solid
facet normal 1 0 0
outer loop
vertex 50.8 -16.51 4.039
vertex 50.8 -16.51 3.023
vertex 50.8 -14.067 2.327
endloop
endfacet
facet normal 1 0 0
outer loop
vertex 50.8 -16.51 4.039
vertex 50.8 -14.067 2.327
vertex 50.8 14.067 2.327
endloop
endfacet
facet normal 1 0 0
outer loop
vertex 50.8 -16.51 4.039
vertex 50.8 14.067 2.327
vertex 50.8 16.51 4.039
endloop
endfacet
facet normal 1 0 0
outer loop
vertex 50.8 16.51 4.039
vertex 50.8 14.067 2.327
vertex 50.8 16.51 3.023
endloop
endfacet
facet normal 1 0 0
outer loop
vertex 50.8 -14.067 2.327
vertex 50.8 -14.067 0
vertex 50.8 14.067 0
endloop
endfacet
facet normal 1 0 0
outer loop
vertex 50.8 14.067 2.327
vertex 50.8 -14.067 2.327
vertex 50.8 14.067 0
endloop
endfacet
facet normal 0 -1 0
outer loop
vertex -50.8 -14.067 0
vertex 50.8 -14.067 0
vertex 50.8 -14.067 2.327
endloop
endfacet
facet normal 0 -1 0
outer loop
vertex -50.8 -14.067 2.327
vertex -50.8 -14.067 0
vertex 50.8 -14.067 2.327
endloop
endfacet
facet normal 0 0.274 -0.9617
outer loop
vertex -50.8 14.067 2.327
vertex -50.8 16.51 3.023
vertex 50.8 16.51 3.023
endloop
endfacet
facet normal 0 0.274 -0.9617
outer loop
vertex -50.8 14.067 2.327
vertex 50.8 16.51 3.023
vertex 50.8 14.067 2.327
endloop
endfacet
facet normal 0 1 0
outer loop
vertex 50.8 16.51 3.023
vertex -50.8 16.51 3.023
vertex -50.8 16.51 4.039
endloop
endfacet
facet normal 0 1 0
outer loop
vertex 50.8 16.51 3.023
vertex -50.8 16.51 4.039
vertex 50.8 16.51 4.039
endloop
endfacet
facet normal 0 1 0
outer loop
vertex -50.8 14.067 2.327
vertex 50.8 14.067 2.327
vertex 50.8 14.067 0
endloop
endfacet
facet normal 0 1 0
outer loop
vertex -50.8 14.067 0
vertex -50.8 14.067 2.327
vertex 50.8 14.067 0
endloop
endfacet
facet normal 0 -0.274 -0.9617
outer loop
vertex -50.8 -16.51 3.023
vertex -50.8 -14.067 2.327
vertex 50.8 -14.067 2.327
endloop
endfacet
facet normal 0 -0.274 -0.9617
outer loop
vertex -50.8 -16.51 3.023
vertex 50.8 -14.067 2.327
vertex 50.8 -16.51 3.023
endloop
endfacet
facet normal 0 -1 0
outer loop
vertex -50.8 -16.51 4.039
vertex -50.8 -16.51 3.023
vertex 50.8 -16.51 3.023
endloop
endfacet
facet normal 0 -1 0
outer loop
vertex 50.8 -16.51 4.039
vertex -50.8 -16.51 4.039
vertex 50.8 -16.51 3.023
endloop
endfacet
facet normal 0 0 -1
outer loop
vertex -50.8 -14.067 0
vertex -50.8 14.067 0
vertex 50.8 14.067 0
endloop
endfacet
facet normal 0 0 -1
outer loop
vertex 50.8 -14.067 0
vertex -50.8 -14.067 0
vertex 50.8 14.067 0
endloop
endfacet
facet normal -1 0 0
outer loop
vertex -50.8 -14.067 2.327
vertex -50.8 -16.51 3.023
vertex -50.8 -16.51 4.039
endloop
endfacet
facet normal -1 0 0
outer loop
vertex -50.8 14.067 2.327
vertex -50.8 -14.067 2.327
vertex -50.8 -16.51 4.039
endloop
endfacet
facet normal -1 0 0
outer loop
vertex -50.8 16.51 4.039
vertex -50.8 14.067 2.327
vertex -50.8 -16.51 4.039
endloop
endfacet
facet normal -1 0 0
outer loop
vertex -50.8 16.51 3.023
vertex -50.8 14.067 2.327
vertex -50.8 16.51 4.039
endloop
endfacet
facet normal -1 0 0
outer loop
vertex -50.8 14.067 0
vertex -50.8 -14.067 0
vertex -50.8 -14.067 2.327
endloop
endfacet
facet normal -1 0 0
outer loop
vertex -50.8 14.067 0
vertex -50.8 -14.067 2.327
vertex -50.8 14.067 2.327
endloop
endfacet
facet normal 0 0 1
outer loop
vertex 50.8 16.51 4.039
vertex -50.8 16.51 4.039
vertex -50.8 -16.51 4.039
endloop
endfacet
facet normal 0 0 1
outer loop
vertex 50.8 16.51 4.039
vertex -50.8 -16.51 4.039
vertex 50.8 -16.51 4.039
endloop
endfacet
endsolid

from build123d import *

# Parameters (mm, degrees)
F0_W     = 101.6
F0_H     = 33.02
F1_DEPTH = 4.0386
F3_DEPTH = 76.2
F4_DEPTH = 38.1
F5_DEPTH = 38.1


with BuildPart() as f1:
    # F0 (on Top) → F1 (new body)
    with BuildSketch(Plane.XY):
        Rectangle(F0_W, F0_H)
    extrude(amount=F1_DEPTH)

    # F2 (on face) → F3 (cut)
    with BuildSketch(Plane.YZ.offset(50.8)):
        Polygon((-16.51, 0), (-14.06698055, 0), (-14.06698055, 2.3274338565), (-16.51, 3.0226), align=None)
        Polygon((16.51, 0), (16.51, 3.0226), (14.06698055, 2.3274338565), (14.06698055, 0), align=None)
    extrude(amount=-F3_DEPTH, mode=Mode.SUBTRACT)

    # F4 (cut): a face of the model
    f4_faces = [f1.faces().sort_by_distance(p)[0] for p in [
        (-25.4, -15.3413966196, 1.345035768),
    ]]
    extrude(f4_faces, amount=-F4_DEPTH, mode=Mode.SUBTRACT)

    # F5 (cut): a face of the model
    f5_faces = [f1.faces().sort_by_distance(p)[0] for p in [
        (-25.4, 15.3413966196, 1.345035768),
    ]]
    extrude(f5_faces, amount=-F5_DEPTH, mode=Mode.SUBTRACT)


solid = f1.part
